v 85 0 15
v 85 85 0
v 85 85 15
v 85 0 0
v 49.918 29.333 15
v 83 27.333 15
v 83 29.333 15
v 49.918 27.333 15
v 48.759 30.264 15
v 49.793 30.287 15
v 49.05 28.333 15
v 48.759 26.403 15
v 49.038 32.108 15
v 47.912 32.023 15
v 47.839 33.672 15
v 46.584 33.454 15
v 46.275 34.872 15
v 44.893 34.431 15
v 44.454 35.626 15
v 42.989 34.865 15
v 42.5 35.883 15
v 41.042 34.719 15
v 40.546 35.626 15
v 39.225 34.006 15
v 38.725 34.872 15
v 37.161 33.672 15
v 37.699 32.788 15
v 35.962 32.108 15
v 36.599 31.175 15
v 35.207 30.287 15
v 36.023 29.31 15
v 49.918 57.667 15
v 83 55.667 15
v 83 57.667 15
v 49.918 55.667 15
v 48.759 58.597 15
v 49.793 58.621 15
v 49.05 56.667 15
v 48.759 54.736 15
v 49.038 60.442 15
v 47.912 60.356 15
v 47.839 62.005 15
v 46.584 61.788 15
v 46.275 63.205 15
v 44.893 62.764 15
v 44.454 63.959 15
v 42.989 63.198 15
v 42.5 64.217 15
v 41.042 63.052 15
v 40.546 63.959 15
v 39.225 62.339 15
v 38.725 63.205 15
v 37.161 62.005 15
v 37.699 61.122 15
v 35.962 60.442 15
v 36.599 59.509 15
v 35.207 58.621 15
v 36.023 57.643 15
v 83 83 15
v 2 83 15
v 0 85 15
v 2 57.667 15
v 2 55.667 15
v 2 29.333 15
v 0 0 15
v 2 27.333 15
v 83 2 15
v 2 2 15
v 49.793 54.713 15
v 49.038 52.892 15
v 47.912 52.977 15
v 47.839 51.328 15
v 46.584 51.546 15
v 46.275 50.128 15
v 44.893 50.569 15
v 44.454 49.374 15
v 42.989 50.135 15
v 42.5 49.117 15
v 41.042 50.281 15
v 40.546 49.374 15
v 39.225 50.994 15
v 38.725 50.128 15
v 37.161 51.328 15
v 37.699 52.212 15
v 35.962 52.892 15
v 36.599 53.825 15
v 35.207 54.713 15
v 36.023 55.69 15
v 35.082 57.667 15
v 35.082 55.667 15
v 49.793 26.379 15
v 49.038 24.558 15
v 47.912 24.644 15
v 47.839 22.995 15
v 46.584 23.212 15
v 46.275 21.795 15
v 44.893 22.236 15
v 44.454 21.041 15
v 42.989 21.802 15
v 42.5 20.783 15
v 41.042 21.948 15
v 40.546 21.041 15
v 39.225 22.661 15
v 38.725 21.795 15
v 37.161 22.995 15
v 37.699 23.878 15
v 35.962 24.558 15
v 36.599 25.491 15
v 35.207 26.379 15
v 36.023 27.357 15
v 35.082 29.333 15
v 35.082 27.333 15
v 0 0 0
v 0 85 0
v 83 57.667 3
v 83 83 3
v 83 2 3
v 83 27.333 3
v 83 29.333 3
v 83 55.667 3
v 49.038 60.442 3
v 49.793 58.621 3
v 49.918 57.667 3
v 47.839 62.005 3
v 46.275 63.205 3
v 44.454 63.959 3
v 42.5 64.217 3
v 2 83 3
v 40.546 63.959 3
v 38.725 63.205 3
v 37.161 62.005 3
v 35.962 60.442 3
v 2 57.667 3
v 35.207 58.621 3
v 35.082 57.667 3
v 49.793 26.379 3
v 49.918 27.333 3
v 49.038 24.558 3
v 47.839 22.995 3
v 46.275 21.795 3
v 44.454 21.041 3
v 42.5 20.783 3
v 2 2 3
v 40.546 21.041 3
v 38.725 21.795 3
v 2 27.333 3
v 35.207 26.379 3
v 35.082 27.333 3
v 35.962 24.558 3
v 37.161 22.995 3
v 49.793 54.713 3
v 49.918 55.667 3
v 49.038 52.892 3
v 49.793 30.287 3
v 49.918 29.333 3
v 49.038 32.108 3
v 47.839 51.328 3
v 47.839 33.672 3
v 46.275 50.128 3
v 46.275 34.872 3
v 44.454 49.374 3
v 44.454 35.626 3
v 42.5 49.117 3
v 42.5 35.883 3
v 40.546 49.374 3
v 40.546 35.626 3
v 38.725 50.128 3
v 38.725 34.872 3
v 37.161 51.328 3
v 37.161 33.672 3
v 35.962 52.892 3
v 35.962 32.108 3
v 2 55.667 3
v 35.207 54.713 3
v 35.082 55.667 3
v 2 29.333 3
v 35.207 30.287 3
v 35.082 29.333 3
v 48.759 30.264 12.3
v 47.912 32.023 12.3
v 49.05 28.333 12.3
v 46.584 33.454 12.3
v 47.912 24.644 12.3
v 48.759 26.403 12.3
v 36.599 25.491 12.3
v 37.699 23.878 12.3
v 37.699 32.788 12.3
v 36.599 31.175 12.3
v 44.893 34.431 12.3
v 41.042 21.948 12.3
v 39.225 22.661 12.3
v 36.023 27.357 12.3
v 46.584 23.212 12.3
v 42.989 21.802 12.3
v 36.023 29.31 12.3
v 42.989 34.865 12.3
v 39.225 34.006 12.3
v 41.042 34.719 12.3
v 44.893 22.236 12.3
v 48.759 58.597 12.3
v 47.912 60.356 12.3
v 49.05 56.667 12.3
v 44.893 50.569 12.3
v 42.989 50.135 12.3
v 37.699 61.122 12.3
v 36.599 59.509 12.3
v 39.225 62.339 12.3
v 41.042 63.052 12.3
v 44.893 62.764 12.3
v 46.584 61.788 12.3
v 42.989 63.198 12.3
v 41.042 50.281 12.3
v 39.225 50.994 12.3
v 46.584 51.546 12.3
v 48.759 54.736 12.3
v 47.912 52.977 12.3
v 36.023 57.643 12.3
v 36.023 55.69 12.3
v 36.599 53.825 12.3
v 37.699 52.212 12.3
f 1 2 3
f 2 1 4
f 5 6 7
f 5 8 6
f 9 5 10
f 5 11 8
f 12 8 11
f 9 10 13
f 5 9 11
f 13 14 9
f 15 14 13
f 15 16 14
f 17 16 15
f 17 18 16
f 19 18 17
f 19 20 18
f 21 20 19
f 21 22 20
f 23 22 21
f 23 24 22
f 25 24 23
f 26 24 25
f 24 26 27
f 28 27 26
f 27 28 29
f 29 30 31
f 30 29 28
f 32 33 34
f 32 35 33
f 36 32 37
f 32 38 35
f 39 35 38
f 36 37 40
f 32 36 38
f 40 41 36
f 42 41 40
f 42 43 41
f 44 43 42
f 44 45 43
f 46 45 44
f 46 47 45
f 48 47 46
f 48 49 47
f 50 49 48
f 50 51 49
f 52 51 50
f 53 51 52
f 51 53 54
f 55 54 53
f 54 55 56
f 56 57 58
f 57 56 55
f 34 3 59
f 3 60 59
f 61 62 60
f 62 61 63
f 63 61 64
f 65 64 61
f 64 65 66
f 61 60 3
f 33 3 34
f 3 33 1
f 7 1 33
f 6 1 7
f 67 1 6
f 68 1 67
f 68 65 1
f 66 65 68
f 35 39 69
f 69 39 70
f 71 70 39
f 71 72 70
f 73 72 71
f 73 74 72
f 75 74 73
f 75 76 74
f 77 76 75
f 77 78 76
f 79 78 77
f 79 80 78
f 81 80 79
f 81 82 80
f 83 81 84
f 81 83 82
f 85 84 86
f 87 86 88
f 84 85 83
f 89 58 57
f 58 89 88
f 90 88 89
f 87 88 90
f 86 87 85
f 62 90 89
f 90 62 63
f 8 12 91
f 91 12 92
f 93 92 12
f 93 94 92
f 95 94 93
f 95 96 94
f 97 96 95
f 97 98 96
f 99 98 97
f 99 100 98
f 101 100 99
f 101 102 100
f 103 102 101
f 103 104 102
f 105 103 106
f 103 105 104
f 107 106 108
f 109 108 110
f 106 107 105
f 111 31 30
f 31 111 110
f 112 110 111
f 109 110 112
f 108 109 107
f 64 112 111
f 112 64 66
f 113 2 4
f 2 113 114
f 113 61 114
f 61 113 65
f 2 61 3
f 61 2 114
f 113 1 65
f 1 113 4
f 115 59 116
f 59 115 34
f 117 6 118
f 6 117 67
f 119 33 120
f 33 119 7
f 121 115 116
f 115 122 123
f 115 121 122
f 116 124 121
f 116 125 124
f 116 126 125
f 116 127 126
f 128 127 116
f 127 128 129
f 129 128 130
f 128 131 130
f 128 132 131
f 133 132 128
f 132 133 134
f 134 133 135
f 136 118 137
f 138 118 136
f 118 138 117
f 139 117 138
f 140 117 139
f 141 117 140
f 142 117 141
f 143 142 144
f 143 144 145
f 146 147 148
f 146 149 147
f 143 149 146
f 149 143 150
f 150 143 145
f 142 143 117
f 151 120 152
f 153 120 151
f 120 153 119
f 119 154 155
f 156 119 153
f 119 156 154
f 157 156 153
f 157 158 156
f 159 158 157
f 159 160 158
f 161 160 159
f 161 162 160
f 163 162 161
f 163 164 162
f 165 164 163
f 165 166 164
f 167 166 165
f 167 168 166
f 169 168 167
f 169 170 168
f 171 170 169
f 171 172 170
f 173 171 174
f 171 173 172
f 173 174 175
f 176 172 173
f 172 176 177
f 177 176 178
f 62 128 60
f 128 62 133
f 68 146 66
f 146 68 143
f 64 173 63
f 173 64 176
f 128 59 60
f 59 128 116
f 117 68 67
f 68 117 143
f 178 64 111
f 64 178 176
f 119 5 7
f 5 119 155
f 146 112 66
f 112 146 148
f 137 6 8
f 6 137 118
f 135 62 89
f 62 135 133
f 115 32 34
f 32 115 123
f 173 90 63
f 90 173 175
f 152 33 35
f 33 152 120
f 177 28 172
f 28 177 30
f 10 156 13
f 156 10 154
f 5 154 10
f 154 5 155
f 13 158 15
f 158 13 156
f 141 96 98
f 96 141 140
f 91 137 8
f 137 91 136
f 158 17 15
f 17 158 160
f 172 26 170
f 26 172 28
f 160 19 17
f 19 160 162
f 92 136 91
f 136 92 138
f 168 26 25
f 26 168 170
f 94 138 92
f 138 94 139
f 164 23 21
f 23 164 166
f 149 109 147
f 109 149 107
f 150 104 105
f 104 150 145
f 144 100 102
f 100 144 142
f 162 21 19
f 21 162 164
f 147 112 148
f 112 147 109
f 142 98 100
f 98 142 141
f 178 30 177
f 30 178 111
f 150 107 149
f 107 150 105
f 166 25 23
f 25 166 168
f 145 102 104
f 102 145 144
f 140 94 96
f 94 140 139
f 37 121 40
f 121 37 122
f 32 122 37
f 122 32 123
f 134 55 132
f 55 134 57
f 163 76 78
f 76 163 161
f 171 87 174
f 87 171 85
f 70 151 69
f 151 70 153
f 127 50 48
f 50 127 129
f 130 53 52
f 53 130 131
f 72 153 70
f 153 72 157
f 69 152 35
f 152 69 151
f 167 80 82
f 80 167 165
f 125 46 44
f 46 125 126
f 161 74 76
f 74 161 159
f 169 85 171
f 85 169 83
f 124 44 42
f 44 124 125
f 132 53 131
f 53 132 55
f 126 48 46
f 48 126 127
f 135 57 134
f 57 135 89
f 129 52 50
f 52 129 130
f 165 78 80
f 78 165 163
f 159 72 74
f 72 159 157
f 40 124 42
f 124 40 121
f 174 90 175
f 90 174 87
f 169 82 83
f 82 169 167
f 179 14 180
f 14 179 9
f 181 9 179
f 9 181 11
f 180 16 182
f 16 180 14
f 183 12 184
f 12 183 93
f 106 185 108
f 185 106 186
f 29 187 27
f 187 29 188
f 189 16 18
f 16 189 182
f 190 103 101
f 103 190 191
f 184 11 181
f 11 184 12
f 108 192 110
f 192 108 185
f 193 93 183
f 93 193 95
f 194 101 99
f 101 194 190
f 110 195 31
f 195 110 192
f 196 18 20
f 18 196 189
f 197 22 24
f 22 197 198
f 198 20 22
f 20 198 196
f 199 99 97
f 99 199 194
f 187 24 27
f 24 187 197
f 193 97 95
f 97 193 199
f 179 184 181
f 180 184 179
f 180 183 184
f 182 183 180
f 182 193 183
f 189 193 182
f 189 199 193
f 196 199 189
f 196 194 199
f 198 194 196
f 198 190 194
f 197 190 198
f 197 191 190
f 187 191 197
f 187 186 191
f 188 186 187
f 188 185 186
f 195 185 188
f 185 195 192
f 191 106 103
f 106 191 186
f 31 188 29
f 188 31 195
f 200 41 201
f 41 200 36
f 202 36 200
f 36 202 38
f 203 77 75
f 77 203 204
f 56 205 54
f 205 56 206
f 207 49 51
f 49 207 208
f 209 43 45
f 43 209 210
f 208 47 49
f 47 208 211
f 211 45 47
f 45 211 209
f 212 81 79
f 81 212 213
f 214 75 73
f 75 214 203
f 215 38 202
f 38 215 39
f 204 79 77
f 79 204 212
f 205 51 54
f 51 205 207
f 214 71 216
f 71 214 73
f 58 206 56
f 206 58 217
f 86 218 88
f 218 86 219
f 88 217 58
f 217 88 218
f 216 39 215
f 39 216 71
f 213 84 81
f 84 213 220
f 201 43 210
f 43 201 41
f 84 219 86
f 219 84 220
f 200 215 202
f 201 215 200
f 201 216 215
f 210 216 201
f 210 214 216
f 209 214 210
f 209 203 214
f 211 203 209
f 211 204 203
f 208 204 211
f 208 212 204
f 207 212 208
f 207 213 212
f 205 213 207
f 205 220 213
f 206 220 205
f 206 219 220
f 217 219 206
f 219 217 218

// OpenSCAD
length = 85;
width = 85;
height = 15;
wallThickness = 2;
floorThickness = 3;
widthDividers = 2;
lengthDividers = 0;

//Based on magnet size:
magnetBaseOuterDiameter = 15.1;
magnetBaseInnerDiameter = 13.1;
magnetHeight = 2.7;


difference(){
    cube([length, width, height]);
    translate([wallThickness, wallThickness, floorThickness])
        cube([length - wallThickness * 2,width - wallThickness * 2, height - floorThickness]);
}
widthSections = widthDividers + 1;
lengthSections = lengthDividers + 1;
difference() {
    union() {
        if(widthDividers>0)
            for(index=[1:widthDividers])
                translate([0, (width/widthSections) * index - (wallThickness/2), 0])
                cube([length, wallThickness, height]);
        if(lengthDividers>0)
            for(index=[1:lengthDividers])
                translate([ (length/lengthSections) * index - (wallThickness/2), 0, 0])
                cube([wallThickness, width, height]);
        
        translate([length/2, width/3, 0])
            cylinder(height, d=magnetBaseOuterDiameter);
        translate([length/2, 2 * width/3, 0])
            cylinder(height, d=magnetBaseOuterDiameter);
    };
    translate([length/2, width/3, height - magnetHeight])
        cylinder(magnetHeight, d=magnetBaseInnerDiameter);
    translate([length/2, 2 * width/3, height - magnetHeight])
        cylinder(magnetHeight, d=magnetBaseInnerDiameter);
};
